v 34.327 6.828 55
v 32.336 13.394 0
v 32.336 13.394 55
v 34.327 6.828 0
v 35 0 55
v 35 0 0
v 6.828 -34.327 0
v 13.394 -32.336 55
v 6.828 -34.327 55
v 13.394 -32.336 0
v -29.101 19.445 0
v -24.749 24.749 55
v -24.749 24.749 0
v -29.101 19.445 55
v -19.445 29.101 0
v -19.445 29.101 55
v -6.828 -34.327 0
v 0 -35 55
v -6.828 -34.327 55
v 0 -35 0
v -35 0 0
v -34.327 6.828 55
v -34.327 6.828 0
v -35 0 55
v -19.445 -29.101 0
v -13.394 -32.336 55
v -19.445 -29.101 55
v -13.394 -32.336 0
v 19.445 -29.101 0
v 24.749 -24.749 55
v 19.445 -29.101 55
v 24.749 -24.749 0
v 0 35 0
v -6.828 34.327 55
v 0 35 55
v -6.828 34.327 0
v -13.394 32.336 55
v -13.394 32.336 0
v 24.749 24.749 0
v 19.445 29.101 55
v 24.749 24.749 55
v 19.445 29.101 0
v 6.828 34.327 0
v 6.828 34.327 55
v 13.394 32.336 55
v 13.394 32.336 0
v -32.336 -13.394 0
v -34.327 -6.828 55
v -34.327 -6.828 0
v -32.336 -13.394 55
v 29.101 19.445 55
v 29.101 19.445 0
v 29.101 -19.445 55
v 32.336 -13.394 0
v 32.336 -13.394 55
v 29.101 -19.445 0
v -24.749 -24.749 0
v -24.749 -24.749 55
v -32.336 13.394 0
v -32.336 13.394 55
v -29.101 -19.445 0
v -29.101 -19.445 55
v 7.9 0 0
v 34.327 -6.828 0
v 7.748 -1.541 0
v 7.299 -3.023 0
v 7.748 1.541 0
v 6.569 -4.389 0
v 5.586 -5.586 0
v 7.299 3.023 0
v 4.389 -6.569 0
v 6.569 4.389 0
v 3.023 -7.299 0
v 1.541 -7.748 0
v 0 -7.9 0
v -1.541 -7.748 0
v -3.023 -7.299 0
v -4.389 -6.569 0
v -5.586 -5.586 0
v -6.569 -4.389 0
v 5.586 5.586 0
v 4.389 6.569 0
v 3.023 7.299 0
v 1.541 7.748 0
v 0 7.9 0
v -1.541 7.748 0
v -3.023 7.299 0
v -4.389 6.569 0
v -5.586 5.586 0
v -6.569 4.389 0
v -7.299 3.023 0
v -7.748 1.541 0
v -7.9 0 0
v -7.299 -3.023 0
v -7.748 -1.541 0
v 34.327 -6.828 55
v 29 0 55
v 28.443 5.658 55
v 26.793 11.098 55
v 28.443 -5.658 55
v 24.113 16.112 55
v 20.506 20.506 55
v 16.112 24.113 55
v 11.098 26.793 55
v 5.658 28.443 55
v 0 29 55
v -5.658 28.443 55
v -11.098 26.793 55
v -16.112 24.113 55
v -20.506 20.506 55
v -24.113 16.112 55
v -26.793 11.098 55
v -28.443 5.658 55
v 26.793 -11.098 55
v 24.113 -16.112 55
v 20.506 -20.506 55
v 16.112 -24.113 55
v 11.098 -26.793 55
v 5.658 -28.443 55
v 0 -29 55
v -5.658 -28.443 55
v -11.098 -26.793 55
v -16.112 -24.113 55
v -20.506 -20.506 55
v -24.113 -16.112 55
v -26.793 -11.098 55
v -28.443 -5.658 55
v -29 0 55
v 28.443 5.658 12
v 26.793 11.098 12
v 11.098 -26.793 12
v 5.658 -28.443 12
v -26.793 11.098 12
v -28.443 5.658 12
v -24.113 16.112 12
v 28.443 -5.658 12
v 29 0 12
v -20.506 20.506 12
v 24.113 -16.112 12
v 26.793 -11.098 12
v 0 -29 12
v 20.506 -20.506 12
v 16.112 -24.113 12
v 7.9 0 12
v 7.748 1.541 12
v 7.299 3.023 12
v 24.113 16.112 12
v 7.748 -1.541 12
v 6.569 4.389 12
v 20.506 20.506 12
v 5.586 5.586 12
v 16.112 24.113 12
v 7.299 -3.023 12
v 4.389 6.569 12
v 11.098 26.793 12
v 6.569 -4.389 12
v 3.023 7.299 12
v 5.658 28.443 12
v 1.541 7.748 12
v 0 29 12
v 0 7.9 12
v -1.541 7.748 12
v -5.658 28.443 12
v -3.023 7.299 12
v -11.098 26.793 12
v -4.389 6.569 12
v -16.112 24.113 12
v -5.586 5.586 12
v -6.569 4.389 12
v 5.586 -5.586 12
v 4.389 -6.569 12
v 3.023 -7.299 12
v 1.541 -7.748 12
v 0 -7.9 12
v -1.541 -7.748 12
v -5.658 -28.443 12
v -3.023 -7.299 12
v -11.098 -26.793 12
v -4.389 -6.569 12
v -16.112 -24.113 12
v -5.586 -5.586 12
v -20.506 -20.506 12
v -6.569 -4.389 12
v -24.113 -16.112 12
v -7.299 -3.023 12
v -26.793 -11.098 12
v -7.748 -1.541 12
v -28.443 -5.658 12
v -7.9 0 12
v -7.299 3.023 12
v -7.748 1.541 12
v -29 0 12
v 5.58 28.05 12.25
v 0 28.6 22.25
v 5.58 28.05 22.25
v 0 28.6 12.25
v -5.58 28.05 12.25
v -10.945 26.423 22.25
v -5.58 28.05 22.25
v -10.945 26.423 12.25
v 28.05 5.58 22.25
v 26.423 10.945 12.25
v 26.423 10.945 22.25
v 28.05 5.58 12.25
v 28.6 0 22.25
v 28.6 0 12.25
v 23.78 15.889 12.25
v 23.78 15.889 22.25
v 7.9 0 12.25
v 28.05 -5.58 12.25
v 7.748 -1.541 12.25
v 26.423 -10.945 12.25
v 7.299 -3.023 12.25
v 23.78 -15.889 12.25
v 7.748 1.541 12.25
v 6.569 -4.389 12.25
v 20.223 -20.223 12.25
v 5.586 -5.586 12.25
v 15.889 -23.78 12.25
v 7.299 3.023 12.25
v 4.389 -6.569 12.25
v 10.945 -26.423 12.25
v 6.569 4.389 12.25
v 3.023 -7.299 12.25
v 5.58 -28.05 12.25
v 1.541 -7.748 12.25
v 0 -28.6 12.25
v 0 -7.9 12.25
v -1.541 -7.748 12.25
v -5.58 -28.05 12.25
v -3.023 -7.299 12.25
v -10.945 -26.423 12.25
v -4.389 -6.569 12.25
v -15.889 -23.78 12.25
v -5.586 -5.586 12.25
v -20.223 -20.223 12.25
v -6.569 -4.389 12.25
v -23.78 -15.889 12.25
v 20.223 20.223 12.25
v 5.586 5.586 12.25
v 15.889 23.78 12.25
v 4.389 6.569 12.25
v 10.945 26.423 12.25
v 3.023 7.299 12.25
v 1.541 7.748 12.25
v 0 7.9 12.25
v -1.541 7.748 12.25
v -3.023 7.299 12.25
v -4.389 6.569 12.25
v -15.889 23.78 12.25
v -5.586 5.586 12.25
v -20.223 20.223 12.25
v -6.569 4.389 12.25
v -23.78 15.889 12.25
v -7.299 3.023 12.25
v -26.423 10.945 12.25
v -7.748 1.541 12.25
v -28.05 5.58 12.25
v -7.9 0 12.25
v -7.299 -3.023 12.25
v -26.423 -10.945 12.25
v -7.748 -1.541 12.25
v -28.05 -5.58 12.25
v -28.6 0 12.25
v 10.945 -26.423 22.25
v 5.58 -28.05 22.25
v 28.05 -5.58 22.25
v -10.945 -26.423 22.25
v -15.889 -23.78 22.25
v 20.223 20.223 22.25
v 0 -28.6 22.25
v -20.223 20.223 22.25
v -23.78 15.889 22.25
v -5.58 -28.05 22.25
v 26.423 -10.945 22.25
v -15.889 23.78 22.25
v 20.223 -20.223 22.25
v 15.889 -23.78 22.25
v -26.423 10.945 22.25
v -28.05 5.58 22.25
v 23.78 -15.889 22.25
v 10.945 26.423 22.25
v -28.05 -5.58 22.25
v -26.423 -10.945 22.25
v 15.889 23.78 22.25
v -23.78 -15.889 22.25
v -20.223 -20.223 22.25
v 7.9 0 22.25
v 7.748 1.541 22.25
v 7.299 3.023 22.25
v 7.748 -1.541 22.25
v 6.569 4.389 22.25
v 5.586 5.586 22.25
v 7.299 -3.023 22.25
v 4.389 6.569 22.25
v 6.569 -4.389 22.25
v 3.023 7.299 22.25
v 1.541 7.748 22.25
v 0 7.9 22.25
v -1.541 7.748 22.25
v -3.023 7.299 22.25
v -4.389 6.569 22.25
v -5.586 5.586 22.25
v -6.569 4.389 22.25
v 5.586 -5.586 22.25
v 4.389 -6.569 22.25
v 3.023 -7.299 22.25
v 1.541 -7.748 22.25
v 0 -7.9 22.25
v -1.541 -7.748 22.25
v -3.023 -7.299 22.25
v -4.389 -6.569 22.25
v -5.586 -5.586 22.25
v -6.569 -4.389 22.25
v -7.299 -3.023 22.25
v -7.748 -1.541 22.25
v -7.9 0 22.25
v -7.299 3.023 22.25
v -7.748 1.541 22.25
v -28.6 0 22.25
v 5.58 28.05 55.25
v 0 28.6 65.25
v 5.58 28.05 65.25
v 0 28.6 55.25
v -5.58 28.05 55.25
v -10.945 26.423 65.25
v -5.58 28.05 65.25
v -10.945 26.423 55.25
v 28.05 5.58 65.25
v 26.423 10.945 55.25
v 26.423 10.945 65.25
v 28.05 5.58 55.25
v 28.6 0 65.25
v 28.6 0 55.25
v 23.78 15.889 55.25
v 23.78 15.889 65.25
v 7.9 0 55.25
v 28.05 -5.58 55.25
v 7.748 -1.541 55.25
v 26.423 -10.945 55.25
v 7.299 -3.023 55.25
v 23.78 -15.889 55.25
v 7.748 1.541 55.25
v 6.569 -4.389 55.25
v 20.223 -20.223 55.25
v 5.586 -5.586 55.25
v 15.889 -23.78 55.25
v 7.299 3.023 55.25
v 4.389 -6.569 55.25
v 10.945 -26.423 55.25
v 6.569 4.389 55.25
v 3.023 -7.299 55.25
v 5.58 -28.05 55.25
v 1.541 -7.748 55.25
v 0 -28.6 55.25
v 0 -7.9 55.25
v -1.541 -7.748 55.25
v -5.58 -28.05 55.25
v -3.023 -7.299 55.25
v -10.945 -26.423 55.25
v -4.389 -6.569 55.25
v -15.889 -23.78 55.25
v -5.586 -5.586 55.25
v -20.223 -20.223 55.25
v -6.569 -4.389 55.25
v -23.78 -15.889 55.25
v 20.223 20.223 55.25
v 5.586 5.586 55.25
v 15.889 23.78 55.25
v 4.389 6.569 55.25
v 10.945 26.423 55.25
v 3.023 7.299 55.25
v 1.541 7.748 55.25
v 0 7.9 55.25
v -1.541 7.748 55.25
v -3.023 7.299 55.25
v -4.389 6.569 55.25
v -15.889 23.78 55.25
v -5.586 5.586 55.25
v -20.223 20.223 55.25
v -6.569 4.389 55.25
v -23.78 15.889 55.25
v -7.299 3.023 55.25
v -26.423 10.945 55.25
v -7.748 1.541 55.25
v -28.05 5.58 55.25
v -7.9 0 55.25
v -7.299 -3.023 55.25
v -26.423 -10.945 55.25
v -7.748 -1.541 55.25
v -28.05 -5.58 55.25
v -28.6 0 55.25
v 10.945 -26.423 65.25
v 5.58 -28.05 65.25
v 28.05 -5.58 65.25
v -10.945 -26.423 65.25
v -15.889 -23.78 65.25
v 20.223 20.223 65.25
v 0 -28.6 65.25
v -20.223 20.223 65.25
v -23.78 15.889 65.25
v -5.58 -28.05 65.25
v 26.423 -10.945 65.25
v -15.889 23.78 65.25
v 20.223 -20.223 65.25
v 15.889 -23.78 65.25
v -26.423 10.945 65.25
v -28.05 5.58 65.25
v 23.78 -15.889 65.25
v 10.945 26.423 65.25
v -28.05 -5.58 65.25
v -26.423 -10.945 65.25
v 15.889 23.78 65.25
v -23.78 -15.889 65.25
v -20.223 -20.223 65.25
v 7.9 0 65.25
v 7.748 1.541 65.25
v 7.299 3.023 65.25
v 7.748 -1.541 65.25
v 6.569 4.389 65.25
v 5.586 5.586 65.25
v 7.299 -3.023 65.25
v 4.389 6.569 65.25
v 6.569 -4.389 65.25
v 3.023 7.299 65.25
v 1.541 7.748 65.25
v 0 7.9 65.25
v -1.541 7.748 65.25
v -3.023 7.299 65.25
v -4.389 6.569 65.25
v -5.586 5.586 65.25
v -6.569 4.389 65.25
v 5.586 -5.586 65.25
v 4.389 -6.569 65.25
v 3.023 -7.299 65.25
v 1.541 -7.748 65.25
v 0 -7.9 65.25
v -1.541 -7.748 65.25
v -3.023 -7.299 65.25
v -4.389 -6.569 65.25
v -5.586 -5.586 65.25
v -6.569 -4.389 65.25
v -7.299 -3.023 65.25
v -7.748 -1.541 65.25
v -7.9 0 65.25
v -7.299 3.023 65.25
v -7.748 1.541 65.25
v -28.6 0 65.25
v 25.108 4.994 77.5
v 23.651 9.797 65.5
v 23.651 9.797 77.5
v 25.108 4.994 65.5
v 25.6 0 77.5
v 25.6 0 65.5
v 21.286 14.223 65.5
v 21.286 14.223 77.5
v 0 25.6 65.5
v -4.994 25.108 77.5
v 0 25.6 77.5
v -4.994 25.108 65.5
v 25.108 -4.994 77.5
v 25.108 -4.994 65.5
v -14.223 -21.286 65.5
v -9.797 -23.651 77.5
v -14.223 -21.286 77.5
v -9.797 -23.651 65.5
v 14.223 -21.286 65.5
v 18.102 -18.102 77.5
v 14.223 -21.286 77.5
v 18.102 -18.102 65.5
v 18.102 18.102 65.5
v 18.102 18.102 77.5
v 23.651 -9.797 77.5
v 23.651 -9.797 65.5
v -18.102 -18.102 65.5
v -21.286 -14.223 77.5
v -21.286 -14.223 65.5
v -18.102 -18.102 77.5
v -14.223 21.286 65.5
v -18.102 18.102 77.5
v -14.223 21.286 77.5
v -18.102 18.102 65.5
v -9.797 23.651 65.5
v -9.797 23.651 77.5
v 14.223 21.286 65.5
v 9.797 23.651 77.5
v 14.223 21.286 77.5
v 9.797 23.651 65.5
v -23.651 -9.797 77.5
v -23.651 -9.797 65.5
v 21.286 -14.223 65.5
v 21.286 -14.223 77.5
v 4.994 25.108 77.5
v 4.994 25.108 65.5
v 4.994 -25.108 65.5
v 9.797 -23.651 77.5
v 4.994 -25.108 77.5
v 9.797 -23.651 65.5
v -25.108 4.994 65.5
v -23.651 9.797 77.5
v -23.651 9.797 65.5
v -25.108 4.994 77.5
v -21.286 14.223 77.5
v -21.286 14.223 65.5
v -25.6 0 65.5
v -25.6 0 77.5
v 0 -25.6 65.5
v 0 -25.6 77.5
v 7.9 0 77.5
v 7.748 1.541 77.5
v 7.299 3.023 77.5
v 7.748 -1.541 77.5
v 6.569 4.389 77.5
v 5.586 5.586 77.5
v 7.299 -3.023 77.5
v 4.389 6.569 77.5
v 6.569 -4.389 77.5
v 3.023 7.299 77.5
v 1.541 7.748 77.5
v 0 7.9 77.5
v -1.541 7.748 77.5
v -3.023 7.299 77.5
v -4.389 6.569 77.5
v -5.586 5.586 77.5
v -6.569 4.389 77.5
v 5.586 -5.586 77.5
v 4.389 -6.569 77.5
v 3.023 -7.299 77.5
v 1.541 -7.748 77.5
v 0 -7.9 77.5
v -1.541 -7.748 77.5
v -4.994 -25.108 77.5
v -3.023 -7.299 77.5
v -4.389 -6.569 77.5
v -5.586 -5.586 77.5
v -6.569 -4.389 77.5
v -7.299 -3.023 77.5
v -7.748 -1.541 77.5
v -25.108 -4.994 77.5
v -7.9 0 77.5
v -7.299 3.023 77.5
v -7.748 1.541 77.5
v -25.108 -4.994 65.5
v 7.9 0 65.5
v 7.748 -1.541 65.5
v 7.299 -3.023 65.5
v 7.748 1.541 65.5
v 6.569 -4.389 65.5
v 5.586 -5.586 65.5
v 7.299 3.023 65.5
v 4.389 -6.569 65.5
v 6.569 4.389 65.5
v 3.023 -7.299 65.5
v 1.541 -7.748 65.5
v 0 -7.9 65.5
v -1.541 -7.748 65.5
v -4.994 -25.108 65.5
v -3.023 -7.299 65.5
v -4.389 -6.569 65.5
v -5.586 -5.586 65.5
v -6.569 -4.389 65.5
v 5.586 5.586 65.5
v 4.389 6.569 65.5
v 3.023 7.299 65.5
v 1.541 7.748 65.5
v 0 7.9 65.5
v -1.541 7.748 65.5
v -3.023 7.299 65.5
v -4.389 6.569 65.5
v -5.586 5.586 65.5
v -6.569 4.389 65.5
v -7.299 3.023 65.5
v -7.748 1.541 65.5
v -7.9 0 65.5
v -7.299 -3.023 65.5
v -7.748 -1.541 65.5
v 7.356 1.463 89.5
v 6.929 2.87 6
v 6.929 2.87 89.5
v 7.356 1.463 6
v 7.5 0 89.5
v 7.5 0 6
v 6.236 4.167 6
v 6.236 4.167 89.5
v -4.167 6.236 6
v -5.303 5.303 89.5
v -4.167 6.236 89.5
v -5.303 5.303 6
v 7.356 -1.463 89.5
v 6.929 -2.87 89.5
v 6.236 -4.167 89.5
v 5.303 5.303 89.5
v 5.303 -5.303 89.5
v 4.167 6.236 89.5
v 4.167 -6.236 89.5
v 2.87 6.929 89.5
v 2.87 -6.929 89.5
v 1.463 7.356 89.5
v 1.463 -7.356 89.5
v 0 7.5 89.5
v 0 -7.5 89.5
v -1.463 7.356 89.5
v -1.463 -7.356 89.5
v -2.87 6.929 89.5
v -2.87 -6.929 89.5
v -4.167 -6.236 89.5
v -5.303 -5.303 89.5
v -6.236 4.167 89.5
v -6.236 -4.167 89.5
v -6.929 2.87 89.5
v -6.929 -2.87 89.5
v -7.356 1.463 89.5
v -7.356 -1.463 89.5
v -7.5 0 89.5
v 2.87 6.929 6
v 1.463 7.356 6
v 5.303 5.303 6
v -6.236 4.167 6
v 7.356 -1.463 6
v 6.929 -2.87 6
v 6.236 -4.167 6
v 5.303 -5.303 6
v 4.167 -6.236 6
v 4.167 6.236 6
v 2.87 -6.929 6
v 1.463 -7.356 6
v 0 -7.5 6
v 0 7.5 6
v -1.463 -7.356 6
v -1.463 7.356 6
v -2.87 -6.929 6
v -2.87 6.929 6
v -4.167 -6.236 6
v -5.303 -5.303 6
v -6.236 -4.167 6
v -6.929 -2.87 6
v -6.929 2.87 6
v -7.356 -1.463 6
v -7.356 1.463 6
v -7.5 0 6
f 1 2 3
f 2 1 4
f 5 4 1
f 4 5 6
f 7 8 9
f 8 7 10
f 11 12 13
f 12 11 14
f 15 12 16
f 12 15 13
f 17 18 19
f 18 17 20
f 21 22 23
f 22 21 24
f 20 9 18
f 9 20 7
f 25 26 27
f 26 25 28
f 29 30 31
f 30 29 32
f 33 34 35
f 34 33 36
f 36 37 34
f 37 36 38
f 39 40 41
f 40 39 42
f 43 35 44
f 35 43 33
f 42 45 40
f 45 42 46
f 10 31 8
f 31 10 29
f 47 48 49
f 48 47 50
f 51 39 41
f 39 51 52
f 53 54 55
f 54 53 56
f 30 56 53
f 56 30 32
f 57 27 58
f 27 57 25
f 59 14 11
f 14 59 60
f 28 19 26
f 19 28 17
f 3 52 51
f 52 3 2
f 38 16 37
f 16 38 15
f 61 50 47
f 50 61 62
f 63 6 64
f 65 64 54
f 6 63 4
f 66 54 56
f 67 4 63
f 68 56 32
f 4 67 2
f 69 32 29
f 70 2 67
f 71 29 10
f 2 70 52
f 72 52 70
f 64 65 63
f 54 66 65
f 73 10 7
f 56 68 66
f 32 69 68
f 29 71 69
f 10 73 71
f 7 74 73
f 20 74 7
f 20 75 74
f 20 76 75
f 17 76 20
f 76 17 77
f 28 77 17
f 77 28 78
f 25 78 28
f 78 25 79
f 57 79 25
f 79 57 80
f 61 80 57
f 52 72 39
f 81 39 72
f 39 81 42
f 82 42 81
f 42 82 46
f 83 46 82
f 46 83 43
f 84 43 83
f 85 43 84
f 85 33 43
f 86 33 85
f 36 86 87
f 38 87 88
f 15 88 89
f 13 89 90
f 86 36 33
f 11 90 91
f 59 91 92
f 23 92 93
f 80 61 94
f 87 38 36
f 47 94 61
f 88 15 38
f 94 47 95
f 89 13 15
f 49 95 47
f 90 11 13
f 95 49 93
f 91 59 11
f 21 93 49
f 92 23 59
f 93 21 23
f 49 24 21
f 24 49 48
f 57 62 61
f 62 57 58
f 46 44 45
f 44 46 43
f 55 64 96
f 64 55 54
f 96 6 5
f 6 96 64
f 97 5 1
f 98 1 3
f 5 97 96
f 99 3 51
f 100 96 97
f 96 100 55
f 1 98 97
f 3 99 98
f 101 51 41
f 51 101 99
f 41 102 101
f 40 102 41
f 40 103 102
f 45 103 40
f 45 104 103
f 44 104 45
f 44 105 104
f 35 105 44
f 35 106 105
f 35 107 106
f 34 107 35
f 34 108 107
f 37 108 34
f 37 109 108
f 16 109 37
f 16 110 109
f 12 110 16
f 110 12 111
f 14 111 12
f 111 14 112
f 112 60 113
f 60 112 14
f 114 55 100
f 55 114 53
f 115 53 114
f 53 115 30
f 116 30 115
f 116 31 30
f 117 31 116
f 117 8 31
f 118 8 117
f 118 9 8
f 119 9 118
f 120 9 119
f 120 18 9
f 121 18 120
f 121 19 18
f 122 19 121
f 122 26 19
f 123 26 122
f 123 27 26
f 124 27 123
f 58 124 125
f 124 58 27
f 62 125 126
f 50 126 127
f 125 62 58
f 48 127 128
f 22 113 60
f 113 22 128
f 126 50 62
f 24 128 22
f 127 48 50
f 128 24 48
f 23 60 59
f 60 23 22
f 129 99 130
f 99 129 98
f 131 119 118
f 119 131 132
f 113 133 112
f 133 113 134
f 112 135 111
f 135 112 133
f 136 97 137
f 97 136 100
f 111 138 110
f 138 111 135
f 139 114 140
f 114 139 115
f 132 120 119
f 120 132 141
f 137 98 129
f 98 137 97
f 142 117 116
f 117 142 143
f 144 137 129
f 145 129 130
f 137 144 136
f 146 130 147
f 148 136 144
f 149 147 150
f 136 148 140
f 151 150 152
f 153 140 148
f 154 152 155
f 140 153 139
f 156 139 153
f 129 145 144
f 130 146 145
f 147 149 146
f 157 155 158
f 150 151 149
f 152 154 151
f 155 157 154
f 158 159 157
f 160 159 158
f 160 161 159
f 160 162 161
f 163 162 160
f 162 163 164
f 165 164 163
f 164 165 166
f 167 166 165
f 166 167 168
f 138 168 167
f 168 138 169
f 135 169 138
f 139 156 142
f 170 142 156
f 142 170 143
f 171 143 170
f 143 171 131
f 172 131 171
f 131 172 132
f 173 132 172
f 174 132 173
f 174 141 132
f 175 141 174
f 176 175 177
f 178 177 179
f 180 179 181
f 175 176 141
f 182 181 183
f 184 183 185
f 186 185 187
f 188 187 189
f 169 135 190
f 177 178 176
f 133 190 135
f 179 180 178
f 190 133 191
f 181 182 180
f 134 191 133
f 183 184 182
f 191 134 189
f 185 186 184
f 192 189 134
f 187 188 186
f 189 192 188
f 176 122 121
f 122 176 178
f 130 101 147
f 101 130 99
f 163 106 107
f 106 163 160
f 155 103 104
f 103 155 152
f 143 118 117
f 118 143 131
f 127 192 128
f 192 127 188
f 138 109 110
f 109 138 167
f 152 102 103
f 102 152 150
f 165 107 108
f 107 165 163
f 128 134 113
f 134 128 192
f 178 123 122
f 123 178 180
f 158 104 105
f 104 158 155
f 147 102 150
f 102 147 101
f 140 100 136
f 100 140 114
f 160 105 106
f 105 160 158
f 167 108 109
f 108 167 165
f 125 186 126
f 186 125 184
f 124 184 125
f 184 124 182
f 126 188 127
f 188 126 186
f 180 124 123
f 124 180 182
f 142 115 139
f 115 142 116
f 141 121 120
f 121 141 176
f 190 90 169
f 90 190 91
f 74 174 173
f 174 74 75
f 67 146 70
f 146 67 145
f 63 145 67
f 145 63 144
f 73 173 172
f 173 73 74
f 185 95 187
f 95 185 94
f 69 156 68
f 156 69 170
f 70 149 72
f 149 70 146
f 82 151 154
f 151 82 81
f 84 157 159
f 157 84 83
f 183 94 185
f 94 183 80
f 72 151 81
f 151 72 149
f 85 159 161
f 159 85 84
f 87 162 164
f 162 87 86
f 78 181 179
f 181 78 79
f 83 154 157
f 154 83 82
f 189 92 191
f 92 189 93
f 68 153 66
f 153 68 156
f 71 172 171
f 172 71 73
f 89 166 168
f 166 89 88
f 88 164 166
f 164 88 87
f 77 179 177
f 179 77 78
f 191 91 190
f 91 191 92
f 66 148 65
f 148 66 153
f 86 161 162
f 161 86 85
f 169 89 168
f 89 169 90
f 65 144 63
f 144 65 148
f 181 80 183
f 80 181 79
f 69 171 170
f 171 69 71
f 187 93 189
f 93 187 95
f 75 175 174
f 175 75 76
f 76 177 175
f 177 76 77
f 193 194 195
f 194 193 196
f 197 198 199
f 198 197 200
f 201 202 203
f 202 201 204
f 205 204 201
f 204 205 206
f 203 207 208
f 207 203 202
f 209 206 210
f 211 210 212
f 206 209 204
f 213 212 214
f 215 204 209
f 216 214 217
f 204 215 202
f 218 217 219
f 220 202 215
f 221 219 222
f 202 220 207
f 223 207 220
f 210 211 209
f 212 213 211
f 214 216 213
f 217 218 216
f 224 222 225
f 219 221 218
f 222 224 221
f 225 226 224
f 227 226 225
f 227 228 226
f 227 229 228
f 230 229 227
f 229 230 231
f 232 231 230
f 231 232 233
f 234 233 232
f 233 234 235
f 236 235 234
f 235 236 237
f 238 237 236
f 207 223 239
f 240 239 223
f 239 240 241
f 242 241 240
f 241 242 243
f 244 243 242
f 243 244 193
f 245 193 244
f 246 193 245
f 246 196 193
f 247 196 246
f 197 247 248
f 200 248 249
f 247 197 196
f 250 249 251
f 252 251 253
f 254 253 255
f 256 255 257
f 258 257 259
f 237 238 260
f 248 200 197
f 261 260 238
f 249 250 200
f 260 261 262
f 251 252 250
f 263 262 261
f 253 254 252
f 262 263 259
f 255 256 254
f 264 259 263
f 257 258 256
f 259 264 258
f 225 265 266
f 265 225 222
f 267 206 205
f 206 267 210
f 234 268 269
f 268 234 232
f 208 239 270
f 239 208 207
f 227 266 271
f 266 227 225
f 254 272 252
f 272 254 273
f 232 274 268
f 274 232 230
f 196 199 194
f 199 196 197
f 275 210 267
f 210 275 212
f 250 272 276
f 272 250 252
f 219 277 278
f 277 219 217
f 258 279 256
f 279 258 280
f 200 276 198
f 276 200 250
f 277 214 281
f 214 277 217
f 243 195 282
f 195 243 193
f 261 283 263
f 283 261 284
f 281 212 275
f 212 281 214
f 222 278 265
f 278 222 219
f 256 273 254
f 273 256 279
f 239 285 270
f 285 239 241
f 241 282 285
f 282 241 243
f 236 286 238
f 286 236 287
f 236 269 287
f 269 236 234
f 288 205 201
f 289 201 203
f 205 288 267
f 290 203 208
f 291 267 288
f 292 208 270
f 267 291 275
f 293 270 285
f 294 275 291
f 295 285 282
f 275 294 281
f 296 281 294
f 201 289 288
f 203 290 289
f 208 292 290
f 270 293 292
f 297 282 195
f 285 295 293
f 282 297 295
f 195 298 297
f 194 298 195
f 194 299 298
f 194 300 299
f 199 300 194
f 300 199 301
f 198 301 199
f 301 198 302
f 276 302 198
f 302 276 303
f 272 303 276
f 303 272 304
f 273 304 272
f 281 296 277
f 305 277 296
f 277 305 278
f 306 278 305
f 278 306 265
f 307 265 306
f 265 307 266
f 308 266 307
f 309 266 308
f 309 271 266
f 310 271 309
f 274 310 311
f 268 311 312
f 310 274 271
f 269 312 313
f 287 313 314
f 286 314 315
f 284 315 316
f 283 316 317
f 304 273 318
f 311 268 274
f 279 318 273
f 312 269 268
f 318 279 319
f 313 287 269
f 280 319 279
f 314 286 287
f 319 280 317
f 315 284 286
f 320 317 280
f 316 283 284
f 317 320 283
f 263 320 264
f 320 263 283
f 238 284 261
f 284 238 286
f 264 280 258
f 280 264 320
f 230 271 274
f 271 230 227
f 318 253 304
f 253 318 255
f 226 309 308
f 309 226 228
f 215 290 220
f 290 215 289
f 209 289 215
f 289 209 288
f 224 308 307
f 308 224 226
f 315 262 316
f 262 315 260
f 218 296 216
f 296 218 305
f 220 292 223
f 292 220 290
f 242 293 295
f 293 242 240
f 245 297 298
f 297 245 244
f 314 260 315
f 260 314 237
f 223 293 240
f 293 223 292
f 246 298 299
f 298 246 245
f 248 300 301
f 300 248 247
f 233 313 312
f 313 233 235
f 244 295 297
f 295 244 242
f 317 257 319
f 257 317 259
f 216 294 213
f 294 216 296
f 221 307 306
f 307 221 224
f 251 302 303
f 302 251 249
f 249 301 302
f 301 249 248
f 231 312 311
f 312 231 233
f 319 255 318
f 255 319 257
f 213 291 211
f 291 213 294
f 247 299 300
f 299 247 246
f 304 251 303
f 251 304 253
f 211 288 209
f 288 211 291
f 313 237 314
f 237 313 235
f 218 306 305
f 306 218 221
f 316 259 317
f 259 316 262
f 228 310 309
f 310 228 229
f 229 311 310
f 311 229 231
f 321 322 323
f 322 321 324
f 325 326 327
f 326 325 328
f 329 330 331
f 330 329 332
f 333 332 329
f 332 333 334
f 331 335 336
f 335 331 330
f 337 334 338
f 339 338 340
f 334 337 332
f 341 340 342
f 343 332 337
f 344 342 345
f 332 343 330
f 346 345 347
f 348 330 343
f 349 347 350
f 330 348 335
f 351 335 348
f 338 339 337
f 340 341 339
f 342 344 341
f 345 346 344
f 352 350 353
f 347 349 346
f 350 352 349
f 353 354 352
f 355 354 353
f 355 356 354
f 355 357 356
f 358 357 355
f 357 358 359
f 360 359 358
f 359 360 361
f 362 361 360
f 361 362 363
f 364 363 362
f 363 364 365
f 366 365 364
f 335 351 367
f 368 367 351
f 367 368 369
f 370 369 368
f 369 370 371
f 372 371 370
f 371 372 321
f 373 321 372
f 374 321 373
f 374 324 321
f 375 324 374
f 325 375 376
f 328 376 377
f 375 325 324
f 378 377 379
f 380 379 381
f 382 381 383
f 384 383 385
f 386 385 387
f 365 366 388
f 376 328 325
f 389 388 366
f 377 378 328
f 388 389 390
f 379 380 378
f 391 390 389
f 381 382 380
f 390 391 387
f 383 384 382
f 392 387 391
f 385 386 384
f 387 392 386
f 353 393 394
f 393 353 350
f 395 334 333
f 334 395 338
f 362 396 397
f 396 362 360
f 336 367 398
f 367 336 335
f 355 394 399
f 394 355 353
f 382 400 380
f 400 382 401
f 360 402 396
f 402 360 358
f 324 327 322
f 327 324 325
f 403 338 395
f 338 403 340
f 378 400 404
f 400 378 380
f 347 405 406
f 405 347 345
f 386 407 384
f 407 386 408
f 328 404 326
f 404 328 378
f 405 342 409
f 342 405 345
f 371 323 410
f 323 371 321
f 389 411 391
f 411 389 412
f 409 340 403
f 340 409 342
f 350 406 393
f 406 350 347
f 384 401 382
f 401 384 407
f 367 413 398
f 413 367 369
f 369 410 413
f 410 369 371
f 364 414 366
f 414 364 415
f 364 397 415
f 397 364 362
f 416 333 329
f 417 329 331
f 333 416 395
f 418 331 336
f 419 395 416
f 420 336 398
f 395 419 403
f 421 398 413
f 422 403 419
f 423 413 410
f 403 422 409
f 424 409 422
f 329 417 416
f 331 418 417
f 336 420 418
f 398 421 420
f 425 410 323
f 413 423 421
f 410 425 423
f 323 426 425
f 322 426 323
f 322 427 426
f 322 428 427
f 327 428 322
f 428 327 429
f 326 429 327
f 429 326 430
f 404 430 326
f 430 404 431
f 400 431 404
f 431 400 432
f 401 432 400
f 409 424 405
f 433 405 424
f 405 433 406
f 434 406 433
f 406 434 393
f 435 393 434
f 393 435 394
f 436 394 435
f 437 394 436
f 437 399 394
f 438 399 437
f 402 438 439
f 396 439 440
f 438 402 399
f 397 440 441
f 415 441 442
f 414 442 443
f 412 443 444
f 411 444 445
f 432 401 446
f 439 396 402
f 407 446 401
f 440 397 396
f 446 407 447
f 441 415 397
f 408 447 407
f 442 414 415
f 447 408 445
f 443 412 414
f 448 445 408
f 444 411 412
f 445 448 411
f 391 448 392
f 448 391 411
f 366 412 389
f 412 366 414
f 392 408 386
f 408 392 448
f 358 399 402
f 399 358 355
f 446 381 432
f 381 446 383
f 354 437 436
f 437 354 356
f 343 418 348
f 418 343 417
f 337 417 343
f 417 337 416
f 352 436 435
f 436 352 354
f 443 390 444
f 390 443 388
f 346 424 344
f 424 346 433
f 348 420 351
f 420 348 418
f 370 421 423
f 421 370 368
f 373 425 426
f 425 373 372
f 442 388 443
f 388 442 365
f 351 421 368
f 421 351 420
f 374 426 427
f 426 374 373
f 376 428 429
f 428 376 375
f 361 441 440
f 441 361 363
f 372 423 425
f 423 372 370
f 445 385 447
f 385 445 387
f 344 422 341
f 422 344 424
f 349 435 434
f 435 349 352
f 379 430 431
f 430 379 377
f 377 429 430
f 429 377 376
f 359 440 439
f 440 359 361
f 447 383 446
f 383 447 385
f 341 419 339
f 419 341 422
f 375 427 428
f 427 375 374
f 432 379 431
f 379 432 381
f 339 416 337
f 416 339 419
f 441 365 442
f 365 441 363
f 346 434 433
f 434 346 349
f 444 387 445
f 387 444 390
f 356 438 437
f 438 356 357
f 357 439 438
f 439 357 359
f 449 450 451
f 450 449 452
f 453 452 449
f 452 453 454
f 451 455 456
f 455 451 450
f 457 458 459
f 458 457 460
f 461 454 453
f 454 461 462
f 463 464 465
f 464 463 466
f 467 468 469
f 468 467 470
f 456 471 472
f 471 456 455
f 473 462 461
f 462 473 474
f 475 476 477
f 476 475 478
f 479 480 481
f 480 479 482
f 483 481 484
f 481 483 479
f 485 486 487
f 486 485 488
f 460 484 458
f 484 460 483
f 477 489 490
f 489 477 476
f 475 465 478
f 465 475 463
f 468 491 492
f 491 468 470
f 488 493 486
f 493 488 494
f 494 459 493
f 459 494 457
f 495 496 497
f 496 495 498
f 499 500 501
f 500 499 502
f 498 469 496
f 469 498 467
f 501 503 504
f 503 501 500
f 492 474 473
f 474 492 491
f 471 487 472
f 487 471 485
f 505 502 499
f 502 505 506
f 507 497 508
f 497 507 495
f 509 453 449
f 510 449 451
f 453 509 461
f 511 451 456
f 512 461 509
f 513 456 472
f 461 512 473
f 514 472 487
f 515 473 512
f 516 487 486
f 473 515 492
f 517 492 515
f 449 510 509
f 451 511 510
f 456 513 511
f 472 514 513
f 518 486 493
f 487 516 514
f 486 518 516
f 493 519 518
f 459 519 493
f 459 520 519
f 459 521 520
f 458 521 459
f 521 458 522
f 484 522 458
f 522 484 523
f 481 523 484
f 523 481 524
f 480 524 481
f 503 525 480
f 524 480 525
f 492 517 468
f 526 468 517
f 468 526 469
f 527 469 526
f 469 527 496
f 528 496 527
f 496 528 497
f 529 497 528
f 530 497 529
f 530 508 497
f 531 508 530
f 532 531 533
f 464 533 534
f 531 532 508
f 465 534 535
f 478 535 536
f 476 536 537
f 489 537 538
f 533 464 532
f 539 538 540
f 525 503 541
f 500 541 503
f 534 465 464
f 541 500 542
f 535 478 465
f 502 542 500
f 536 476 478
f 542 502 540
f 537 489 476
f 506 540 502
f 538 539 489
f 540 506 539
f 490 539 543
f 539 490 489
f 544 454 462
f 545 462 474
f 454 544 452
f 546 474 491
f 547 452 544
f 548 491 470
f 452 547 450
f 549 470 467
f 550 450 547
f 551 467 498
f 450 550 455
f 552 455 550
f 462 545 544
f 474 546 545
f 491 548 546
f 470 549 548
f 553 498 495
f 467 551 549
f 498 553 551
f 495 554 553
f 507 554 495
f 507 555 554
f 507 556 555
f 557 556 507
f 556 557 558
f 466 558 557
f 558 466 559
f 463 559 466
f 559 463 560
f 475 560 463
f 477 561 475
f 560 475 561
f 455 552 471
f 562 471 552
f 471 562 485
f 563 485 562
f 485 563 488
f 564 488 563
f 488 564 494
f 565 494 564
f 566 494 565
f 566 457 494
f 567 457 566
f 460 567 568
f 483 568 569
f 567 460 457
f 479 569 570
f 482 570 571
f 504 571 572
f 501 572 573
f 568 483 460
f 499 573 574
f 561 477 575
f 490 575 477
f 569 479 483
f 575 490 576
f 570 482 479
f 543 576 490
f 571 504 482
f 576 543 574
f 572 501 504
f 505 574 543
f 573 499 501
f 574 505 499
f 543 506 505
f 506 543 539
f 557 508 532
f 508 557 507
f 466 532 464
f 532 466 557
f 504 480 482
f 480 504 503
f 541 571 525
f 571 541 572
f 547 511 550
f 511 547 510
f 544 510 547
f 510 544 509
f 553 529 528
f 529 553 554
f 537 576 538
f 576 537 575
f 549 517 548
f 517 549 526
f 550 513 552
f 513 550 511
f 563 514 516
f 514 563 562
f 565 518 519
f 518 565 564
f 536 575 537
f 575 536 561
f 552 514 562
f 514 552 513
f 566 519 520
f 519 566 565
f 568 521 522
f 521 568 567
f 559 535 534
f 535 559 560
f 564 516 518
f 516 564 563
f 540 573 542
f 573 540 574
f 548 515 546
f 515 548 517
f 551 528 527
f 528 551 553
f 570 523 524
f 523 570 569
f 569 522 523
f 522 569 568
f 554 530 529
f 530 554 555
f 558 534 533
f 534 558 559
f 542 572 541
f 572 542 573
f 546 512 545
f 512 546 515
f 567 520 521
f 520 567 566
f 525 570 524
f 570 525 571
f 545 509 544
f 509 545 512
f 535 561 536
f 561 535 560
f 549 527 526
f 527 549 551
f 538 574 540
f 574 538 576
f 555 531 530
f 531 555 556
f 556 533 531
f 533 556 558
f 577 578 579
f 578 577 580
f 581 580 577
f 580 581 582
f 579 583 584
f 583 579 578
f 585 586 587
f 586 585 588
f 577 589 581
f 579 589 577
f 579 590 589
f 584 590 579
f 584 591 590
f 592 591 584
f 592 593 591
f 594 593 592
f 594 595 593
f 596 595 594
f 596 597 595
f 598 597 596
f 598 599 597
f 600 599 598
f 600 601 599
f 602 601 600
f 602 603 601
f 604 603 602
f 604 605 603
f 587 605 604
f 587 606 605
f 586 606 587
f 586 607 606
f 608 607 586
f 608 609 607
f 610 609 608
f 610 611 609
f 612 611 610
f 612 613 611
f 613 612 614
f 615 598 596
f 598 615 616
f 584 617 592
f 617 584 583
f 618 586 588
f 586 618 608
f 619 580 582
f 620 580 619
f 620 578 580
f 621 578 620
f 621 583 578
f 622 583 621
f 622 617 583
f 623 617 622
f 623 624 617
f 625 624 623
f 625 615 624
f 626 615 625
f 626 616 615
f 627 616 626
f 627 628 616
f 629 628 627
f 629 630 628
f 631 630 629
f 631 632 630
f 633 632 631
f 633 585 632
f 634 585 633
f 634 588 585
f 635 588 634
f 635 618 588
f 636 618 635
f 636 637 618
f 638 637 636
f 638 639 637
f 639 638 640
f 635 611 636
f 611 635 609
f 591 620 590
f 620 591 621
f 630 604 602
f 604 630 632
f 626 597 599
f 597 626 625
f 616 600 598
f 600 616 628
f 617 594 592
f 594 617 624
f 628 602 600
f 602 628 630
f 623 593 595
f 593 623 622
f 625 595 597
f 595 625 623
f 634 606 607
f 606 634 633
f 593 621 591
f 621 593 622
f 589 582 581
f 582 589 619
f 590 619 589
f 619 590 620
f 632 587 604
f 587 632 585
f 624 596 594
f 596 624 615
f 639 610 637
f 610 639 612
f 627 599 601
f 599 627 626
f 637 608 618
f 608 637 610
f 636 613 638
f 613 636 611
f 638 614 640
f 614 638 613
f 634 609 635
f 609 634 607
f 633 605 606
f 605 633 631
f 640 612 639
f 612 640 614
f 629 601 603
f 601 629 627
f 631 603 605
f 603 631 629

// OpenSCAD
$fn = 32;

// ------------------------------------------------------------------------
// Bearing housing: housing d70, two bearings and a shaft
// Every part is its own module, assembly() places them once.
// ------------------------------------------------------------------------

// --- part 1 ---
module housing() {
  difference() {
    cylinder(h = 55, d = 70);
    translate([0, 0, 12]) cylinder(h = 44, d = 58);
    translate([0, 0, -1]) cylinder(h = 14, d = 15.8);
  }
}

// --- part 2 ---
module bearing_lower() {
  difference() {
      translate([0, 0, 0]) cylinder(h = 10, d = 57.2);
      translate([0, 0, -1]) cylinder(h = 12, d = 15.8);
    }
}

// --- part 3 ---
module bearing_upper() {
  difference() {
      translate([0, 0, 0]) cylinder(h = 10, d = 57.2);
      translate([0, 0, -1]) cylinder(h = 12, d = 15.8);
    }
}

// --- part 4 ---
module spacer() {
  difference() {
      translate([0, 0, 0]) cylinder(h = 12, d = 51.2);
      translate([0, 0, -1]) cylinder(h = 14, d = 15.8);
    }
}

// --- part 5 ---
module shaft() {
  translate([0, 0, -41.75]) cylinder(h = 83.5, d = 15);
}

// --- assembly ---
module assembly() {
  translate([0, 0, 0]) rotate([0, 0, 0]) housing();
  translate([0, 0, 12.25]) rotate([0, 0, 0]) bearing_lower();
  translate([0, 0, 55.25]) rotate([0, 0, 0]) bearing_upper();
  translate([0, 0, 65.5]) rotate([0, 0, 0]) spacer();
  translate([0, 0, 47.75]) rotate([0, 0, 0]) shaft();
}

assembly();
